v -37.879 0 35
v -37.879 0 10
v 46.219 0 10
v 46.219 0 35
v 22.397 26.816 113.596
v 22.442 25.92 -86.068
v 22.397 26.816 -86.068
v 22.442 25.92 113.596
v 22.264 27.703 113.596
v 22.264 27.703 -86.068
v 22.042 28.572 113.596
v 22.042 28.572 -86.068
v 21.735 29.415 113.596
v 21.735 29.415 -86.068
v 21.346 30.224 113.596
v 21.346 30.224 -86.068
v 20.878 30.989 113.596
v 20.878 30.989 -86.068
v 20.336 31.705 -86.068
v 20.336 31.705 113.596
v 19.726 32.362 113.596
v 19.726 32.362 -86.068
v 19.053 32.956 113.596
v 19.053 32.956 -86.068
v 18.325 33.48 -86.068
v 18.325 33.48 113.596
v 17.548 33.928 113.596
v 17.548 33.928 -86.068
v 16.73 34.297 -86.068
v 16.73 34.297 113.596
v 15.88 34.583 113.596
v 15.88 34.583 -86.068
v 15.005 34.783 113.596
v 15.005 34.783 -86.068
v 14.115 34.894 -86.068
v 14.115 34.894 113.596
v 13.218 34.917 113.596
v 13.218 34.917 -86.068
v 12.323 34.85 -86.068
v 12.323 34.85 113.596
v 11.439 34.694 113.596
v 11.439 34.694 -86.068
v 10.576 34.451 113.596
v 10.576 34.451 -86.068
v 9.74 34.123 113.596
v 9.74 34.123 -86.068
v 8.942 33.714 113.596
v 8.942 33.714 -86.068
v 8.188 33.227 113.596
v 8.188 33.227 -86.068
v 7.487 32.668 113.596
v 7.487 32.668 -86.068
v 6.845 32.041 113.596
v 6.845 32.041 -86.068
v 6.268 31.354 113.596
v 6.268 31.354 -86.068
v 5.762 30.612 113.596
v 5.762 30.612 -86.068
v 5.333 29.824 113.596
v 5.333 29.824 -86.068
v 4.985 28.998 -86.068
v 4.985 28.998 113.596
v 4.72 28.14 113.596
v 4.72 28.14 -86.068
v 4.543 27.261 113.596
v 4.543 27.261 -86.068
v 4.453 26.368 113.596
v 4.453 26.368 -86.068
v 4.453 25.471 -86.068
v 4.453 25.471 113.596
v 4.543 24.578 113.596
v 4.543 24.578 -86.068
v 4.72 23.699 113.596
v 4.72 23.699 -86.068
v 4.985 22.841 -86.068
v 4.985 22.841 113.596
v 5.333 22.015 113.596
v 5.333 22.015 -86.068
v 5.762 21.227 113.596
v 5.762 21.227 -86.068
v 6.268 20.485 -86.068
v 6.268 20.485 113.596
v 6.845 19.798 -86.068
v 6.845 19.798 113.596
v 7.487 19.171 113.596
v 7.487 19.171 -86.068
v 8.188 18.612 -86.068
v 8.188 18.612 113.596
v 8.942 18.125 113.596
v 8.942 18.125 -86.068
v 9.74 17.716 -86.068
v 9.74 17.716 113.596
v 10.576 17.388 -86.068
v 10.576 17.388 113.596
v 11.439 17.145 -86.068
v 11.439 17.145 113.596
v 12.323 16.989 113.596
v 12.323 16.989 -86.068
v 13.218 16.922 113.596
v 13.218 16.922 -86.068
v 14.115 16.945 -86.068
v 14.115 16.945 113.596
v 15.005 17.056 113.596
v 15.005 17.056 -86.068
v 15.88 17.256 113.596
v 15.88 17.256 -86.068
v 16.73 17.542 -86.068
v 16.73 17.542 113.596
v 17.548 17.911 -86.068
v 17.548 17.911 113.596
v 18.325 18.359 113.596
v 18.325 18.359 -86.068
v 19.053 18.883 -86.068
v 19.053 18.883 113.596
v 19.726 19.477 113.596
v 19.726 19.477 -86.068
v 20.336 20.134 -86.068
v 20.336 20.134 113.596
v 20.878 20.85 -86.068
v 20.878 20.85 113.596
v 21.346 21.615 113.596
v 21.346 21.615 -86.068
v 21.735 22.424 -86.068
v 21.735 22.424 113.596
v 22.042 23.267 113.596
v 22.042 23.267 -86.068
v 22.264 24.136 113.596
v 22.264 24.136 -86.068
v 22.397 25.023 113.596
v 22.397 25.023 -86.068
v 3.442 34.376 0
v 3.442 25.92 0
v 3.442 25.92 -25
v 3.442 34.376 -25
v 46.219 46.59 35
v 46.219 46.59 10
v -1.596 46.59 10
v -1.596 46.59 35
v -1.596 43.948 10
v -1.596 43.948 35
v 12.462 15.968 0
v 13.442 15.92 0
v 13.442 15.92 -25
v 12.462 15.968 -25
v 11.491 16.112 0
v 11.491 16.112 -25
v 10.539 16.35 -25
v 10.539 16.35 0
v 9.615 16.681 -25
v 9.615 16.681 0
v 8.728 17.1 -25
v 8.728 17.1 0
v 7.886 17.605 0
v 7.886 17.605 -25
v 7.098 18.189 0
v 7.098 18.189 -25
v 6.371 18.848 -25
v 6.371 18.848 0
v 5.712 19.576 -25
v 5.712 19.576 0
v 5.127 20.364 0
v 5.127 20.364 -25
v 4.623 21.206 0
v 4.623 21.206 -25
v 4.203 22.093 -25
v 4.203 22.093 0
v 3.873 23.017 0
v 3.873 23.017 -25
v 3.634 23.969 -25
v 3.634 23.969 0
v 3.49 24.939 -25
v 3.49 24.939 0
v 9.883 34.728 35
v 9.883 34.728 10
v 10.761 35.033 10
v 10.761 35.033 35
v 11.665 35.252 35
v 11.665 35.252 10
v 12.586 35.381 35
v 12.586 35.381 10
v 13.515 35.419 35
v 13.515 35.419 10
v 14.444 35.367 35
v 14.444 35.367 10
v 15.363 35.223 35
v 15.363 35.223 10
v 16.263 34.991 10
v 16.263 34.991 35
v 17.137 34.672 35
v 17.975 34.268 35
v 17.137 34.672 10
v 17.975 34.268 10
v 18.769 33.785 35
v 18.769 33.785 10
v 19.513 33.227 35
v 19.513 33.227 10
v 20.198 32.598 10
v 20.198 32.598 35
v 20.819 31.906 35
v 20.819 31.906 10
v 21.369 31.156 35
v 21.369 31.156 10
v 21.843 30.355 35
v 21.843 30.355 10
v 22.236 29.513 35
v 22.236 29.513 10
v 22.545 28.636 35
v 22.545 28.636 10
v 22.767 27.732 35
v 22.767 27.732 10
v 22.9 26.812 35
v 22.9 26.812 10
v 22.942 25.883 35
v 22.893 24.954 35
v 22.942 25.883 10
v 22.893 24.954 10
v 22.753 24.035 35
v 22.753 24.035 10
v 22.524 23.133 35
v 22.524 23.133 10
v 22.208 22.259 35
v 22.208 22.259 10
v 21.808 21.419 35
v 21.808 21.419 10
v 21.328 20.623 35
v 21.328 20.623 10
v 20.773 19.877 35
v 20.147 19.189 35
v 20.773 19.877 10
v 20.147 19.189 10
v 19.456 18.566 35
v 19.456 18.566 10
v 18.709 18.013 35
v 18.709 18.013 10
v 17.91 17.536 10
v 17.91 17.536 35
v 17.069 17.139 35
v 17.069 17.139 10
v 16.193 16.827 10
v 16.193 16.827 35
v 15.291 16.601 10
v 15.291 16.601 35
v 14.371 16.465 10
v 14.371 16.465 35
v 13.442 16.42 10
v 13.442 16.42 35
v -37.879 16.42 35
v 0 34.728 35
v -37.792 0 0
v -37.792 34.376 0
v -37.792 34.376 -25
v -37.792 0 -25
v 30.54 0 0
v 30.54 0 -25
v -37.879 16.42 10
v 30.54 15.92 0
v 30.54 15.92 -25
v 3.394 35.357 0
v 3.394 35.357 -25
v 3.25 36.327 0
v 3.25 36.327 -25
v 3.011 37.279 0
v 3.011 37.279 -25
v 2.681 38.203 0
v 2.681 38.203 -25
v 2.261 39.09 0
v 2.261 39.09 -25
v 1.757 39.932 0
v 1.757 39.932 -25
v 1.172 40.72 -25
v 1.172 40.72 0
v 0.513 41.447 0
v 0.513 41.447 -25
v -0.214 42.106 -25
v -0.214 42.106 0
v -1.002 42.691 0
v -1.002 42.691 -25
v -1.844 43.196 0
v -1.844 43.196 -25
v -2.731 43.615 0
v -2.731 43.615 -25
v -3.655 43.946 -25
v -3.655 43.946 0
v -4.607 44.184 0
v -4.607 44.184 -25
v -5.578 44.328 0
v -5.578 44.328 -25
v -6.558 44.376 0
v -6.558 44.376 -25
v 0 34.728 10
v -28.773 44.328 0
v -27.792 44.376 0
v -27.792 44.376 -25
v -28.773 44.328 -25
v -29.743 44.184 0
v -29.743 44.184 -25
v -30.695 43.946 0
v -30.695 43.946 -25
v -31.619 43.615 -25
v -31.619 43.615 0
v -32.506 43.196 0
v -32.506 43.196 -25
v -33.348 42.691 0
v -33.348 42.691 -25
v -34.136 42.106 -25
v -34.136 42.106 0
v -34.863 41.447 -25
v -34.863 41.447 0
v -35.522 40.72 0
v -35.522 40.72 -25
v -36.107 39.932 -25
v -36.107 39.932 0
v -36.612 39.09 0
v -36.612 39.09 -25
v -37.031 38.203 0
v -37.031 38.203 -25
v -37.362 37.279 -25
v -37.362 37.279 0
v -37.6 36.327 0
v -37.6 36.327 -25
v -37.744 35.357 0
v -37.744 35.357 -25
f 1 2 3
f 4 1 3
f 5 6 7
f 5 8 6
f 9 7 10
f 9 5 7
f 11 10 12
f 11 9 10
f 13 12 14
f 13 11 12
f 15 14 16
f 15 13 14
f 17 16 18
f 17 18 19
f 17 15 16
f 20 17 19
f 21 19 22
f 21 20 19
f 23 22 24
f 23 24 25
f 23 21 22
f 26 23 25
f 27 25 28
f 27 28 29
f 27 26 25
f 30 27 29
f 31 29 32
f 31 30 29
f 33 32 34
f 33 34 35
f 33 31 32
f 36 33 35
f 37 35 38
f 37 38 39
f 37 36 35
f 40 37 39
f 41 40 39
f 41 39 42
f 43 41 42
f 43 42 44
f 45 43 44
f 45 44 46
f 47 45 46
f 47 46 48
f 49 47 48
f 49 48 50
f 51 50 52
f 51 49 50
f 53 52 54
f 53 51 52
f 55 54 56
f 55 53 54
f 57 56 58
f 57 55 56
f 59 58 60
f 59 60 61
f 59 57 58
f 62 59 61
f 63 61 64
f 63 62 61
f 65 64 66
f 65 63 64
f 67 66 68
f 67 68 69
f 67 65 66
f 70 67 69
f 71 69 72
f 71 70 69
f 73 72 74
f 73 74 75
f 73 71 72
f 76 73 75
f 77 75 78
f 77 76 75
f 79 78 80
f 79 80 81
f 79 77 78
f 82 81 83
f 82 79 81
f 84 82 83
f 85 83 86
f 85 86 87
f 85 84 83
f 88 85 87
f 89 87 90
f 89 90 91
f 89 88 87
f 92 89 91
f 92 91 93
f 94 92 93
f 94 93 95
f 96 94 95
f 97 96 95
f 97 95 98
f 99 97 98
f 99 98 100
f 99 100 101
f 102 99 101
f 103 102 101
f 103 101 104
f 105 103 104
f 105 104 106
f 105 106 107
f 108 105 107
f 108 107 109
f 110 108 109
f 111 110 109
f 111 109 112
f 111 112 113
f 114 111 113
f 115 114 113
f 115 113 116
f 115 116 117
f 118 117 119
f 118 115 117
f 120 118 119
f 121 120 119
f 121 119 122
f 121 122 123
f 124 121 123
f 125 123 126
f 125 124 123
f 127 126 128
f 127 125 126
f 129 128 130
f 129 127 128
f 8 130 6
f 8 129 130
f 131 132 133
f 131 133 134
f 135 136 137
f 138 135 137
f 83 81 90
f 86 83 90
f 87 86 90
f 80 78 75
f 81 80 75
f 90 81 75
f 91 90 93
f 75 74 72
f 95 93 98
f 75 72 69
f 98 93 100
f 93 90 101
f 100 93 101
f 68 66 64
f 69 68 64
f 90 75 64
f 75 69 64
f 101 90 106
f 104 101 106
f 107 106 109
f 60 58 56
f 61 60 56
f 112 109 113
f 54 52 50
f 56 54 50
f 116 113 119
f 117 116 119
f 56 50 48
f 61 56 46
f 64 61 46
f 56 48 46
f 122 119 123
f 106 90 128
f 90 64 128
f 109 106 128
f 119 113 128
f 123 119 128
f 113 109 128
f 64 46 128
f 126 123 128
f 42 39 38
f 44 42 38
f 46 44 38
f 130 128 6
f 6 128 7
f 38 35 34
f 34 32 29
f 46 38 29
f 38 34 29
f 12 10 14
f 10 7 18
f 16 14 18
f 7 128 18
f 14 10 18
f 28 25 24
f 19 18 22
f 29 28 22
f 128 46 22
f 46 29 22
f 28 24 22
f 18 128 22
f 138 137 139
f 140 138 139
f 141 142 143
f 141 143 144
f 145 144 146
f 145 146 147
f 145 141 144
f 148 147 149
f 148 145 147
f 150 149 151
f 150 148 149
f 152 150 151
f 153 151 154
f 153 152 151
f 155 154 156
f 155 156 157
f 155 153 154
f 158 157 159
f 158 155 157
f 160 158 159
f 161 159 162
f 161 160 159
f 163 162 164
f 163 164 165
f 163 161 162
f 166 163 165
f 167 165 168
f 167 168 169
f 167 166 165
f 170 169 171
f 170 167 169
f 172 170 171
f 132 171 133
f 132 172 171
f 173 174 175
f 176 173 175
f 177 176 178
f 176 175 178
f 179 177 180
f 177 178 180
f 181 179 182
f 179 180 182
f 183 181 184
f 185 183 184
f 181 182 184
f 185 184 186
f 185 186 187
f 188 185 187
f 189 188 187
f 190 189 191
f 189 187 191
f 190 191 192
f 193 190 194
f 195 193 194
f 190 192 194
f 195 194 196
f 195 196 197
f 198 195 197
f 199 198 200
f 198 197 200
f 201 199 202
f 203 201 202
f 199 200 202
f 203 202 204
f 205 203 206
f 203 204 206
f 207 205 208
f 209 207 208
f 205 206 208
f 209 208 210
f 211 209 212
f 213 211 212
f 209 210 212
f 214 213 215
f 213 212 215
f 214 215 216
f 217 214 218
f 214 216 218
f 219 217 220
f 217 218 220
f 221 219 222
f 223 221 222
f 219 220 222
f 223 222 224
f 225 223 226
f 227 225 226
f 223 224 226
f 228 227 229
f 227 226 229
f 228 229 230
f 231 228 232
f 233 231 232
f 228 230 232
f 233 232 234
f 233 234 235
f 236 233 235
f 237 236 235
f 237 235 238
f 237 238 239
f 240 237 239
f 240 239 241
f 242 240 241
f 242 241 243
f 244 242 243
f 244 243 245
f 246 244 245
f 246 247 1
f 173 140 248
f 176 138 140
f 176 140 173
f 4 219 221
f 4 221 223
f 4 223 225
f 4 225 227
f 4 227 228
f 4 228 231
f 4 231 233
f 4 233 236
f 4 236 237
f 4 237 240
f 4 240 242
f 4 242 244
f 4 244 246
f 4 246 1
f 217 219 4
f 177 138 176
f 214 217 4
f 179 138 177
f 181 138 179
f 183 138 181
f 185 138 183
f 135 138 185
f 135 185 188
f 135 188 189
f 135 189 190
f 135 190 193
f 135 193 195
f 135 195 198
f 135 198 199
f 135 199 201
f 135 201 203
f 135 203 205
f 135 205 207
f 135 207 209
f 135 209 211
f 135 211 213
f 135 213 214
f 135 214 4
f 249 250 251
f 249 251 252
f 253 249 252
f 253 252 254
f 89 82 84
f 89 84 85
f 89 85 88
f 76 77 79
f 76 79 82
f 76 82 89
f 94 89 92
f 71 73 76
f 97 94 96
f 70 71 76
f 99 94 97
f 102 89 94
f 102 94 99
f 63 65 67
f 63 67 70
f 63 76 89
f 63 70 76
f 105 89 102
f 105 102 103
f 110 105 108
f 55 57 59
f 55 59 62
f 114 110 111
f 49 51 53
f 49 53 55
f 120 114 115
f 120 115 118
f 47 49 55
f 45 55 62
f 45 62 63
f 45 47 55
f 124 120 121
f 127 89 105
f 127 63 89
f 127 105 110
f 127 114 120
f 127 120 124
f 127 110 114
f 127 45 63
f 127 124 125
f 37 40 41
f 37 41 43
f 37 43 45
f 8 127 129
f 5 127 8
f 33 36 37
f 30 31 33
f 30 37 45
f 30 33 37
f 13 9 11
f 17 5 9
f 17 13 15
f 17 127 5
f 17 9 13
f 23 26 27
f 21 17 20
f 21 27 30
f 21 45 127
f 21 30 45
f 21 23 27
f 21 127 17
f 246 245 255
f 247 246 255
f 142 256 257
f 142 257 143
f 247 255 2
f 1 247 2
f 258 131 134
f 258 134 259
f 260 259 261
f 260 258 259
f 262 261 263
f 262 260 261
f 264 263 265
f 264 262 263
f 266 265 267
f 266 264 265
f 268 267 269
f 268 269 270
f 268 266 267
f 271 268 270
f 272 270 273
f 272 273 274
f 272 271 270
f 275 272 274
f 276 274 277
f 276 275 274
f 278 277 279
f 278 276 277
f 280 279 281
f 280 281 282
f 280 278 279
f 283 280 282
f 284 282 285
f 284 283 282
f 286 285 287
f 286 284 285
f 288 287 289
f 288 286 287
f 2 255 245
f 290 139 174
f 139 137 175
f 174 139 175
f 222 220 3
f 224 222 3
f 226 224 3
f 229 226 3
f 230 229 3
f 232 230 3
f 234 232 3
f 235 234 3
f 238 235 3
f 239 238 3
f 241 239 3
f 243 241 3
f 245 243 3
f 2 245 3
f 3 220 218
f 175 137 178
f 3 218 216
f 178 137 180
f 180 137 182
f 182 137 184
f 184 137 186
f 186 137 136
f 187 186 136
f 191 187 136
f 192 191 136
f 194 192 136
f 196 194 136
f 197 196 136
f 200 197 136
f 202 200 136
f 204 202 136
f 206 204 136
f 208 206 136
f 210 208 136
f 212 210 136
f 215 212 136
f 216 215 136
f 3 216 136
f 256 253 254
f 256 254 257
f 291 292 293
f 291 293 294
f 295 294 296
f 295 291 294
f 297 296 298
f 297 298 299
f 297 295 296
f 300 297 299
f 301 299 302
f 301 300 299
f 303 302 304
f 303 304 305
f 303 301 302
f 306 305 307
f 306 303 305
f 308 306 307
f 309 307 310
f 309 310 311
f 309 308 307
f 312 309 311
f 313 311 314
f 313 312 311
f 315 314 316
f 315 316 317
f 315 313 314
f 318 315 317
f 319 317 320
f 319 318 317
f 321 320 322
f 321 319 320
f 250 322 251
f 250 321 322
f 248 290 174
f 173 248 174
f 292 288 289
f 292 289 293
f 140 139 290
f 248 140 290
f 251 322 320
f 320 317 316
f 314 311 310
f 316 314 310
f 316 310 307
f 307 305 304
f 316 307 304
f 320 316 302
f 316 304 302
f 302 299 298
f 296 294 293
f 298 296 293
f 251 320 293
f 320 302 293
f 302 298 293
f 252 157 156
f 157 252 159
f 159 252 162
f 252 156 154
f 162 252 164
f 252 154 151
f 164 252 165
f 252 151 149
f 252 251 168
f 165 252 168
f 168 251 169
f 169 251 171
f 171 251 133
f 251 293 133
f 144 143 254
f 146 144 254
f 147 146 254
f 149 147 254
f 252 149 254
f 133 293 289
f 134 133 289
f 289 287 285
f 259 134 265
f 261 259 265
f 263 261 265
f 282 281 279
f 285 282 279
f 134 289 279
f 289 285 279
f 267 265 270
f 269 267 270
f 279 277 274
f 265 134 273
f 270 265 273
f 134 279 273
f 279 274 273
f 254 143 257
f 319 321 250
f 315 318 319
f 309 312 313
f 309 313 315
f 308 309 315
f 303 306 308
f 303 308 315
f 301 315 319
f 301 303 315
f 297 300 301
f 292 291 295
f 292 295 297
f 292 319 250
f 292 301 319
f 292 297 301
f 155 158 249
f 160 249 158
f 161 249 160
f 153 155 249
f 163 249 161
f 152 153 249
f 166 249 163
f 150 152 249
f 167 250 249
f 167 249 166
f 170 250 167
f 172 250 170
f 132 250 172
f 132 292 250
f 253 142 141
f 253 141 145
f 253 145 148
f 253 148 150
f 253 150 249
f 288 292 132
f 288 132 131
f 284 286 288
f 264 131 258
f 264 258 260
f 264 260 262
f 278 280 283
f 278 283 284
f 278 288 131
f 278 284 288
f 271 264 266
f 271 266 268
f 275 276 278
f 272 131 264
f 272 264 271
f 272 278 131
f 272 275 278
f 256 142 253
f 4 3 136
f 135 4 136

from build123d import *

# Parameters (mm, degrees)
F3_DEPTH      = 25
F4_DEPTH      = 25
F0_R          = 9
F5_DEPTH      = 113.59639
F5_DEPTH_BACK = 86.06808


with BuildPart() as f3:
    # F0 (on Top) → F3 (new body)
    with BuildSketch(Plane.XY):
        with BuildLine():
            ThreePointArc((3.441991, 34.376368), (0.513059, 41.447436), (-6.558009, 44.376368))
            Line((-6.558009, 44.376368), (-27.792332, 44.376368))
            ThreePointArc((-27.792332, 44.376368), (-34.8634, 41.447436), (-37.792332, 34.376368))
            Line((-37.792332, 34.376368), (-37.792332, 0))
            Line((-37.792332, 0), (30.539684, 0))
            Line((30.539684, 0), (30.539684, 15.919503))
            Line((30.539684, 15.919503), (13.441991, 15.919503))
            ThreePointArc((13.441991, 15.919503), (6.370923, 18.848435), (3.441991, 25.919503))
            Line((3.441991, 25.919503), (3.441991, 34.376368))
        make_face()
    extrude(amount=-F3_DEPTH)


with BuildPart() as f4:
    # F2 (on offset) → F4 (new body)
    with BuildSketch(Plane.XY.offset(10)):
        with BuildLine():
            Line((-37.878919, 16.419503), (-37.878919, 0))
            Line((-37.878919, 0), (46.218919, 0))
            Line((46.218919, 0), (46.218919, 46.590284))
            Line((46.218919, 46.590284), (-1.595739, 46.590284))
            Line((-1.595739, 46.590284), (-1.595739, 43.948493))
            Line((-1.595739, 43.948493), (0, 34.727512))
            Line((0, 34.727512), (9.882642, 34.727512))
            ThreePointArc((9.882642, 34.727512), (22.767389, 27.732499), (13.441991, 16.419503))
            Line((13.441991, 16.419503), (-37.878919, 16.419503))
        make_face()
    extrude(amount=F4_DEPTH)


with BuildPart() as f5:
    # F0 (on Top) → F5 (new body, two sides)
    with BuildSketch(Plane.XY) as f5_sk:
        with Locations((13.441991, 25.919503)):
            Circle(F0_R)
    extrude(amount=F5_DEPTH)
    extrude(f5_sk.sketch, amount=-F5_DEPTH_BACK)


solid = Compound([f3.part, f4.part, f5.part])
